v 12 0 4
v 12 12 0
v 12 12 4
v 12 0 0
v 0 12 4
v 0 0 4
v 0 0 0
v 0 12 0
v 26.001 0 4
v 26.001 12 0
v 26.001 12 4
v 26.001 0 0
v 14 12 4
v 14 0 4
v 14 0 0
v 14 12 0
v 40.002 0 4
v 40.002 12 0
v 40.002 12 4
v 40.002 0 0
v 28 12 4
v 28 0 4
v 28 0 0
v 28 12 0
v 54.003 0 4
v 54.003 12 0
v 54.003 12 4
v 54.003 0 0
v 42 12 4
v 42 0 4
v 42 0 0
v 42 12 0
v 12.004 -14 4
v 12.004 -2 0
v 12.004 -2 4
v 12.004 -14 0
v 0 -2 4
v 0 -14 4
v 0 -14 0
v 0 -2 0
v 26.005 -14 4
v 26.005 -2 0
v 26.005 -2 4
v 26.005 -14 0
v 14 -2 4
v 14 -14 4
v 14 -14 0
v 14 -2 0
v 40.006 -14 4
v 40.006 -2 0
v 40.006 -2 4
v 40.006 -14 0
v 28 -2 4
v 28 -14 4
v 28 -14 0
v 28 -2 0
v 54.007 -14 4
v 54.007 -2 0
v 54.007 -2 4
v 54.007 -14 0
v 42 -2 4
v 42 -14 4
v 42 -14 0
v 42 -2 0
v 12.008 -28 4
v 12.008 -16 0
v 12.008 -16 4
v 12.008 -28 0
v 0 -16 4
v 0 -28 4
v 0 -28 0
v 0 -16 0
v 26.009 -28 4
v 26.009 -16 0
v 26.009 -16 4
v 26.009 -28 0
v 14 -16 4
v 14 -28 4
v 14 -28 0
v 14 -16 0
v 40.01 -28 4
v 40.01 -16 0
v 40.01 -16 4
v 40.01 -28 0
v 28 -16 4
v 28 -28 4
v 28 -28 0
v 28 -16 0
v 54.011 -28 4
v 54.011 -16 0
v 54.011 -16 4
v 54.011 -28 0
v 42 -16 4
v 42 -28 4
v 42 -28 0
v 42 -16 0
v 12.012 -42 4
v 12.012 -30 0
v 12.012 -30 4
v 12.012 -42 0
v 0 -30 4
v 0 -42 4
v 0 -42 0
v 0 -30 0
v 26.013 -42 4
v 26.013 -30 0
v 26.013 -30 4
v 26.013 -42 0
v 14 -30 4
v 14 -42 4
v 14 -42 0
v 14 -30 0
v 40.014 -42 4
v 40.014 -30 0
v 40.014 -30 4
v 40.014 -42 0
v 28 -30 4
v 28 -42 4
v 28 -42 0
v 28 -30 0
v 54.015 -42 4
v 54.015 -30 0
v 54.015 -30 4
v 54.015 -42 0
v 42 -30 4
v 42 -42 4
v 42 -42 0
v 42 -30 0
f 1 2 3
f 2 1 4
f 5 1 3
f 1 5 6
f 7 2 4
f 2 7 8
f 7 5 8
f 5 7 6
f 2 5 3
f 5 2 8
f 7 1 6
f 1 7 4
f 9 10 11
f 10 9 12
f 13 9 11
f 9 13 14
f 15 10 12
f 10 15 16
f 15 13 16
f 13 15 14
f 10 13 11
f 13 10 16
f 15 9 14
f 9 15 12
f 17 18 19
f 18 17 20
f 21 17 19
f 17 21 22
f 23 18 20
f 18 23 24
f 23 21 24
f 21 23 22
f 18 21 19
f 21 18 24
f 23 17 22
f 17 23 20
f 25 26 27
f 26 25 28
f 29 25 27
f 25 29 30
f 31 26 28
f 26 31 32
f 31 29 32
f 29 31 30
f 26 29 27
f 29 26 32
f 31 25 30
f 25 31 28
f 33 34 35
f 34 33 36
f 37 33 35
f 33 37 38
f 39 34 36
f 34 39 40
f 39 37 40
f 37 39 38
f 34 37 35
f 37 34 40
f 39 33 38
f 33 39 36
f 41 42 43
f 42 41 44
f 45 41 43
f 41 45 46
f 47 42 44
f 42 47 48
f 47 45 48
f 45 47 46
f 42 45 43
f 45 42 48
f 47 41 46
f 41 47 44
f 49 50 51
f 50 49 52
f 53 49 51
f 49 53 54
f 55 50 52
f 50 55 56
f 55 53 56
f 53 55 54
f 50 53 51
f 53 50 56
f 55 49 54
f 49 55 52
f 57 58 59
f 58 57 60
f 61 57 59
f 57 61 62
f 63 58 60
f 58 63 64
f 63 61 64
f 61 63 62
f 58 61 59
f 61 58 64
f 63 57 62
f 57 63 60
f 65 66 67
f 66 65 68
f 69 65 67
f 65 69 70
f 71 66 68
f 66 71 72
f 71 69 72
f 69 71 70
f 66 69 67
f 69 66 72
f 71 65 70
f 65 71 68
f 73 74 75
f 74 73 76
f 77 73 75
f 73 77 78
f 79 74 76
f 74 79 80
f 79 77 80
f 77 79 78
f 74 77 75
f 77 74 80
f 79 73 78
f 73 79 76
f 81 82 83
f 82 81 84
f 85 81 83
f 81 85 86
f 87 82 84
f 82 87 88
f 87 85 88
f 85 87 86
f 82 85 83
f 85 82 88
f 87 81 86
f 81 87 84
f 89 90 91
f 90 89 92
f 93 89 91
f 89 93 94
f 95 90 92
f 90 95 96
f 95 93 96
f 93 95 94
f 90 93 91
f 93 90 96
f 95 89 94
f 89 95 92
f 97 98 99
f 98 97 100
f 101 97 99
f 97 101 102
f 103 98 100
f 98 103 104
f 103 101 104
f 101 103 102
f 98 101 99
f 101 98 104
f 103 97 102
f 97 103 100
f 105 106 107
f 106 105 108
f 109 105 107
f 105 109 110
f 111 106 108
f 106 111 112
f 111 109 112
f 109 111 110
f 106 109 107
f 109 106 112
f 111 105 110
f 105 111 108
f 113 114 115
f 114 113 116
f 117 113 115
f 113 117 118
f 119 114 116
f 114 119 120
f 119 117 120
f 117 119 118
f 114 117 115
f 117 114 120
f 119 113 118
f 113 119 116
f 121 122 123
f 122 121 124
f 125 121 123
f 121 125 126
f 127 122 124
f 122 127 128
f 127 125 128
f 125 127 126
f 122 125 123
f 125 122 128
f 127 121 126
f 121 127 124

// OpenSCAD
// distinct geometry per tile (works around the shared-geometry colour bug)
names = ["red","orange","yellow","lime","green","teal","cyan","blue","purple","magenta","pink","brown","black","gray","silver","white"];
for (i = [0:15]) color(names[i]) translate([(i % 4) * 14, -floor(i / 4) * 14, 0]) cube([12 + i * 0.001, 12, 4]);
